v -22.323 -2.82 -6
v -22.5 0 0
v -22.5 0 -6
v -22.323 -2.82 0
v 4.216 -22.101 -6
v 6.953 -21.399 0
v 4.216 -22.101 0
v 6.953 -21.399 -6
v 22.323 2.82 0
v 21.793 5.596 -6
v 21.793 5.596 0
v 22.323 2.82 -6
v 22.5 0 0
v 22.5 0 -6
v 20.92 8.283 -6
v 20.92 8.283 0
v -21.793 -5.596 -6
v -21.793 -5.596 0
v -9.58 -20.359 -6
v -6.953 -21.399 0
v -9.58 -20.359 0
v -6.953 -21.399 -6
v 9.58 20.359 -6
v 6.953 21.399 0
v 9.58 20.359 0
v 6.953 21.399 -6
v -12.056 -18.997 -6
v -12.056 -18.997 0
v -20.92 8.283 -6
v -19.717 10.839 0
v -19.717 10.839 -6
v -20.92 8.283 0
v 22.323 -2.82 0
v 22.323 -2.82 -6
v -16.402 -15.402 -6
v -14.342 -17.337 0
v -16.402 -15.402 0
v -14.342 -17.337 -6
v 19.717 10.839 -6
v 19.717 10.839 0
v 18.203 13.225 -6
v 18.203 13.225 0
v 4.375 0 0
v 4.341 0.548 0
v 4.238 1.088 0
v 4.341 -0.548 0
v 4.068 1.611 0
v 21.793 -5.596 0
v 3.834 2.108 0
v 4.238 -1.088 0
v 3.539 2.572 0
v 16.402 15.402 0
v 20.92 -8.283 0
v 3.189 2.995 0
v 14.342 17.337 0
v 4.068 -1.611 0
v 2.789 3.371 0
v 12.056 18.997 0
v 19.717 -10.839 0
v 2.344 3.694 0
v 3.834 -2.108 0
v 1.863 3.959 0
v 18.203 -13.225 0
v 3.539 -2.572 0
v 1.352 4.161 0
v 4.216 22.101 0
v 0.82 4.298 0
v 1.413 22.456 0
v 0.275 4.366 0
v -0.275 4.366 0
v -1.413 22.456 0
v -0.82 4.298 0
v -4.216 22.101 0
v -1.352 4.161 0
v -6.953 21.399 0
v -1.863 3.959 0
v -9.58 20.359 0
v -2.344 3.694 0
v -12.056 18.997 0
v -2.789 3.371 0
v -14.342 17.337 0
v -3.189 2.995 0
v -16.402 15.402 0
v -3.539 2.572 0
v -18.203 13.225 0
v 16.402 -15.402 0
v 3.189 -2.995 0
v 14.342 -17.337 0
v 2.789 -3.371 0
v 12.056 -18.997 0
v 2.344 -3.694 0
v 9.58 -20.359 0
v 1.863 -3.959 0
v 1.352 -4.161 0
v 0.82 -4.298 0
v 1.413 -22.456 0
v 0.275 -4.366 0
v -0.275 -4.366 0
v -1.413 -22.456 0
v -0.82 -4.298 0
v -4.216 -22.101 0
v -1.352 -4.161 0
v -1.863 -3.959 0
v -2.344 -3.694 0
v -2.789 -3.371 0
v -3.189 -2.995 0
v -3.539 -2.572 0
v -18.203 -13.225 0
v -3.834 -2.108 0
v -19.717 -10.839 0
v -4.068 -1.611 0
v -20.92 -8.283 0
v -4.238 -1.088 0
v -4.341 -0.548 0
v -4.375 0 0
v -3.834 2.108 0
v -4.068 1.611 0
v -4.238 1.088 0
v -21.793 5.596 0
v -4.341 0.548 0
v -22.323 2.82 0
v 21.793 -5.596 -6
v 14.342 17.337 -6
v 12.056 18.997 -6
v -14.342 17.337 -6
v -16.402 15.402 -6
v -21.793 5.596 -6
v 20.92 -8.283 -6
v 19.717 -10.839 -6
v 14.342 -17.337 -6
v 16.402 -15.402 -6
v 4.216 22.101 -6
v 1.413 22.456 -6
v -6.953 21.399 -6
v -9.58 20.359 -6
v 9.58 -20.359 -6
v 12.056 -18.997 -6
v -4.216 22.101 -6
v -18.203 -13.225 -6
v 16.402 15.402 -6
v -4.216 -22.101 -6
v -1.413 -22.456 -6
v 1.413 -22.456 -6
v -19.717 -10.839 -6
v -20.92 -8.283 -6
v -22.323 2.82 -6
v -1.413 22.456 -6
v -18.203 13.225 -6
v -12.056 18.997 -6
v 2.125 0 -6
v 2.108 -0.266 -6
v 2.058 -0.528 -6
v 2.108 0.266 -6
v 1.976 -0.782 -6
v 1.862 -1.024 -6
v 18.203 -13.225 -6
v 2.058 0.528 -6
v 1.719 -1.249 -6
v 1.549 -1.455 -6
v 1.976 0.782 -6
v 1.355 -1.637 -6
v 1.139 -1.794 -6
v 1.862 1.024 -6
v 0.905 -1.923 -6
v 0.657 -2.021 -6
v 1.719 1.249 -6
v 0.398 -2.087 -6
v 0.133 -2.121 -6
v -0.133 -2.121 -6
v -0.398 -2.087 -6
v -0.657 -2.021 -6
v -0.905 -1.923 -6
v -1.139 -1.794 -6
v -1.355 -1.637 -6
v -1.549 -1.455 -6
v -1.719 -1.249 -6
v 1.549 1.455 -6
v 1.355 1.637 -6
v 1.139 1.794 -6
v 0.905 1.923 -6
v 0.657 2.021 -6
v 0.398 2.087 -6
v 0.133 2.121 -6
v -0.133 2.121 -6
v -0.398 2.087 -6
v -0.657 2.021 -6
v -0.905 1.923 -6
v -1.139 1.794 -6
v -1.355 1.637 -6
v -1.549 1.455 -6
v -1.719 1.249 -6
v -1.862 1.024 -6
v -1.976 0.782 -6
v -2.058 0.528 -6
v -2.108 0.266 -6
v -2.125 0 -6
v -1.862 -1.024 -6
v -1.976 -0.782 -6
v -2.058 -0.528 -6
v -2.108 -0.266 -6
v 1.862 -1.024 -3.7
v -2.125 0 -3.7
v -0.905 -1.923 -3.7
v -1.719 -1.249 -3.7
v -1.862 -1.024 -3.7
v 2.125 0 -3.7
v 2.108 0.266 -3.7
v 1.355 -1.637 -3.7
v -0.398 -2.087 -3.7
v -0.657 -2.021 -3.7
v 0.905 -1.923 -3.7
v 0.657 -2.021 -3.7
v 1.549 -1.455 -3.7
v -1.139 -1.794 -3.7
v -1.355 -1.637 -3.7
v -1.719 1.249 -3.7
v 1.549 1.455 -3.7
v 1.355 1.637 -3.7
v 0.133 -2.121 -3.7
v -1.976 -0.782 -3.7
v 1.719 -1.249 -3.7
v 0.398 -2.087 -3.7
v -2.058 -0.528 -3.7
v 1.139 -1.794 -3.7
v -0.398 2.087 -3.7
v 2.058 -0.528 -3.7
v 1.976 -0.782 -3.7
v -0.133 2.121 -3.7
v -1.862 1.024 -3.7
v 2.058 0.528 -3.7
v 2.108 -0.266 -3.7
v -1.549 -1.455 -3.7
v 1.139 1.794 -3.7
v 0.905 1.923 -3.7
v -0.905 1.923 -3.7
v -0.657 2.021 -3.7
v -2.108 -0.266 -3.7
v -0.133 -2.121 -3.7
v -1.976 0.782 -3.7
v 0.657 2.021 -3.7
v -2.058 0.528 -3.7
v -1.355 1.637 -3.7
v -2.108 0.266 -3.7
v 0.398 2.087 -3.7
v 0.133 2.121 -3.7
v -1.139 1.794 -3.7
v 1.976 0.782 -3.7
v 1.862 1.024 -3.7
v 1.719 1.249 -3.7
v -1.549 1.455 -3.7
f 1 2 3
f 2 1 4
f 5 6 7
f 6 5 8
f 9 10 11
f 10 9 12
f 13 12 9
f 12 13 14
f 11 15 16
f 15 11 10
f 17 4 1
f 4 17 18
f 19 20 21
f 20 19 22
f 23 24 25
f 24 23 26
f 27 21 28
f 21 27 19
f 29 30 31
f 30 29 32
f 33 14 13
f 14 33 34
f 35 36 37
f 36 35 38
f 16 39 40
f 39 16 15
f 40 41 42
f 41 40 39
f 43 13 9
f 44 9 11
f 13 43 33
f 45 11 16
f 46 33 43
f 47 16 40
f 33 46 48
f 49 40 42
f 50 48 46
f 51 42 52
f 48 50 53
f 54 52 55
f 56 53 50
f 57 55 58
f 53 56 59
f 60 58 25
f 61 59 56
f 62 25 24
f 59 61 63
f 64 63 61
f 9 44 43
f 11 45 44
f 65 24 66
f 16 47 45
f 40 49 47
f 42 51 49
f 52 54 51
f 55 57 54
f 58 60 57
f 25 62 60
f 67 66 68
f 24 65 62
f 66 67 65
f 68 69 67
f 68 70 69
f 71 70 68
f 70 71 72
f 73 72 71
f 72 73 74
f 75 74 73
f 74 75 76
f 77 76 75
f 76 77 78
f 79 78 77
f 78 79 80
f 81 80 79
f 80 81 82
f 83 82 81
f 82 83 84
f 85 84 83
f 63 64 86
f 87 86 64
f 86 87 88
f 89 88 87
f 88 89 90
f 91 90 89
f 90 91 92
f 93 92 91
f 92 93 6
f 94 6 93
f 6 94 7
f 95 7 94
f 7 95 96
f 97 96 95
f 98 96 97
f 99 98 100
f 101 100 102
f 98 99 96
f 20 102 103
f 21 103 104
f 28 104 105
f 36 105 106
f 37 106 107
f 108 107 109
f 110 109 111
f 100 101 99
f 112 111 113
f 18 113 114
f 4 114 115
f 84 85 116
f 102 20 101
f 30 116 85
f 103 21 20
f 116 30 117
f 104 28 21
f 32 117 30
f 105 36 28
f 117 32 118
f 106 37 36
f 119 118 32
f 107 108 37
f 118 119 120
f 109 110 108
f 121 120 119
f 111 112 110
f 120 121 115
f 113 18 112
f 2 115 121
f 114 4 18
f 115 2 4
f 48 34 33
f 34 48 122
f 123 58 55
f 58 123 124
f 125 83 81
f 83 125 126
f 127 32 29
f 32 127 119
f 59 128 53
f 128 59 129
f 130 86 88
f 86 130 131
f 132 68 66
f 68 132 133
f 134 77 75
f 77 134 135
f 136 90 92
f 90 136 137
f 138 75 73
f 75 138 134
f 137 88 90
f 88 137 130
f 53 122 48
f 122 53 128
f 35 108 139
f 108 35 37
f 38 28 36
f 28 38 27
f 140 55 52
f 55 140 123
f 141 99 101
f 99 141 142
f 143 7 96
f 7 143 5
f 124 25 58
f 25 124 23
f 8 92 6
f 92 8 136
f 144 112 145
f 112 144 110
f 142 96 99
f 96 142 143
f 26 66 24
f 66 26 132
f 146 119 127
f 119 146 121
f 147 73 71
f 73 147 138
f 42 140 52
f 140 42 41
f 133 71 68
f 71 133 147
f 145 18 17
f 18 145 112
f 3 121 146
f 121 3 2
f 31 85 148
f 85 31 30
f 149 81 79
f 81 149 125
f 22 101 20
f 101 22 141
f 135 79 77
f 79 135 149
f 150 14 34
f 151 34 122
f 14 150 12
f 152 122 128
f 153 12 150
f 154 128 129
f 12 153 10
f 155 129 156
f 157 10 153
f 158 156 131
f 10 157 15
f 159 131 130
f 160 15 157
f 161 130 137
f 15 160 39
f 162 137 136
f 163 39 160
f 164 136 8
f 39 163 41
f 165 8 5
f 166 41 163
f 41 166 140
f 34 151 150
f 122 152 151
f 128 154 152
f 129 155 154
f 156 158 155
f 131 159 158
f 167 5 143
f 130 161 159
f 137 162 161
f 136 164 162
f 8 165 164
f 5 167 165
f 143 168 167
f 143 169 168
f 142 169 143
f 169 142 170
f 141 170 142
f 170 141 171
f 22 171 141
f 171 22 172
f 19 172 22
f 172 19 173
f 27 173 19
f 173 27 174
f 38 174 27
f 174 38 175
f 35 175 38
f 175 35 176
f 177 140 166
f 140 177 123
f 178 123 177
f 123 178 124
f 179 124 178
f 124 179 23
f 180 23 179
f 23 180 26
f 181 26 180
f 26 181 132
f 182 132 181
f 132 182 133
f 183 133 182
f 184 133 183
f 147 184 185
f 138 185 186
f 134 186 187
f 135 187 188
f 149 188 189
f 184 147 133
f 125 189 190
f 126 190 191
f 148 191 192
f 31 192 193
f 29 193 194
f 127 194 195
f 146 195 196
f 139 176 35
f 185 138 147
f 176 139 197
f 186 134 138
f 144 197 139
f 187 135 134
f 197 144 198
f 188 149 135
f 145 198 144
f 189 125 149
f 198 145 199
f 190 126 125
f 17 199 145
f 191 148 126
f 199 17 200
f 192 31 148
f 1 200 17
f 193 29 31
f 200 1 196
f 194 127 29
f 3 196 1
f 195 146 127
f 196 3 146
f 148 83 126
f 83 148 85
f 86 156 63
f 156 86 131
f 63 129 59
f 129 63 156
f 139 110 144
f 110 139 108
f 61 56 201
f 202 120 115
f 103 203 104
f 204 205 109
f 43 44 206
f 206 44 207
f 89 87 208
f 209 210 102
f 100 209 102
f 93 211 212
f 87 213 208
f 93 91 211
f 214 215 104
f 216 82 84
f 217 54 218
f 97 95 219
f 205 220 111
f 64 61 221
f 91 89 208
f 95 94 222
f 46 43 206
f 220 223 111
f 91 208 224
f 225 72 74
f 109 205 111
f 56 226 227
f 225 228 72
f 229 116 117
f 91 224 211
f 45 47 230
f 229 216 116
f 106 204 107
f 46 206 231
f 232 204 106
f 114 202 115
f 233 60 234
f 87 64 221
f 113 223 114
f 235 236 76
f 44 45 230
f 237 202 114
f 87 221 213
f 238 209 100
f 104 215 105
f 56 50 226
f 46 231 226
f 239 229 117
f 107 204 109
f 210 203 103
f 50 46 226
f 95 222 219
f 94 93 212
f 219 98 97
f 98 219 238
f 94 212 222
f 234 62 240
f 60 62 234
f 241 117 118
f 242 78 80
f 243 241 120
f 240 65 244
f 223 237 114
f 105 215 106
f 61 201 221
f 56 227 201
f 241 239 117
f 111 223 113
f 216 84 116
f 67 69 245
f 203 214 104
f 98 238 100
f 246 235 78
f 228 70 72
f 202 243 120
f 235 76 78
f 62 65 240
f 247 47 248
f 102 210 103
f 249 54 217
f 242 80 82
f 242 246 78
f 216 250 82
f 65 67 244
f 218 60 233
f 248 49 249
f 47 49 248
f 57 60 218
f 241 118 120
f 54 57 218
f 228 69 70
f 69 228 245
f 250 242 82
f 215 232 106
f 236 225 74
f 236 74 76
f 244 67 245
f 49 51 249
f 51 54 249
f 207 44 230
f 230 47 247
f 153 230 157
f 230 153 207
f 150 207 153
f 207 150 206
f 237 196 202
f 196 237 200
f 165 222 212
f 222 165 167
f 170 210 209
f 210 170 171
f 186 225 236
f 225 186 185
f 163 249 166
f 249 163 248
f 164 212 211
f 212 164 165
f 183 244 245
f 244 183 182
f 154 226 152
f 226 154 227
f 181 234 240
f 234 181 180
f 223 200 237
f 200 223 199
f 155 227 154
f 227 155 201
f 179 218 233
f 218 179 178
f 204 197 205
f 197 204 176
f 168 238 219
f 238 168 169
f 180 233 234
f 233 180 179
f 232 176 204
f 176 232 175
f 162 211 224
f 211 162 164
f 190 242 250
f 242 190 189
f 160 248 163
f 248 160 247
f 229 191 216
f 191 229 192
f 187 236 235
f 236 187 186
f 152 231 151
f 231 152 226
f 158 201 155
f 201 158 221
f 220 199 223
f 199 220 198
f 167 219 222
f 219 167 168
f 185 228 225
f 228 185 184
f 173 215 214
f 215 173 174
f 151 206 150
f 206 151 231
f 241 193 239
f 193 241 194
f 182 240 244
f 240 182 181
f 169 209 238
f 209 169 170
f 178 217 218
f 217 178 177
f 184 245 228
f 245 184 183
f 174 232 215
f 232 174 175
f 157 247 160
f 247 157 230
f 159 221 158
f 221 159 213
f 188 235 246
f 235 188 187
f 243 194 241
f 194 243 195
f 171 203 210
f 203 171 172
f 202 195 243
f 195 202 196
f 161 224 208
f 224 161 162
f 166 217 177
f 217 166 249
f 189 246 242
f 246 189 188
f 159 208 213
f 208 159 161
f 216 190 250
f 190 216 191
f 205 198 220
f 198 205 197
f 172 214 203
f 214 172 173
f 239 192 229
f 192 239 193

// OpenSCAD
$fn = 50;


difference() {
	union() {
		translate(v = [0, 0, -6.0000000000]) {
			cylinder(h = 6, r = 22.5000000000);
		}
		translate(v = [0, 0, -6.0000000000]) {
			cylinder(h = 6, r = 2.8750000000);
		}
	}
	union() {
		translate(v = [0, 0, 0]) {
			rotate(a = [0, 0, 0]) {
				difference() {
					union() {
						translate(v = [0, 0, -6.0000000000]) {
							cylinder(h = 6, r = 2.0000000000);
						}
						translate(v = [0, 0, -3.7000000000]) {
							cylinder(h = 3.7000000000, r1 = 2.1250000000, r2 = 4.3750000000);
						}
						translate(v = [0, 0, -6.0000000000]) {
							cylinder(h = 6, r = 2.1250000000);
						}
						translate(v = [0, 0, -6.0000000000]) {
							cylinder(h = 6, r = 2.0000000000);
						}
					}
					union();
				}
			}
		}
	}
}
